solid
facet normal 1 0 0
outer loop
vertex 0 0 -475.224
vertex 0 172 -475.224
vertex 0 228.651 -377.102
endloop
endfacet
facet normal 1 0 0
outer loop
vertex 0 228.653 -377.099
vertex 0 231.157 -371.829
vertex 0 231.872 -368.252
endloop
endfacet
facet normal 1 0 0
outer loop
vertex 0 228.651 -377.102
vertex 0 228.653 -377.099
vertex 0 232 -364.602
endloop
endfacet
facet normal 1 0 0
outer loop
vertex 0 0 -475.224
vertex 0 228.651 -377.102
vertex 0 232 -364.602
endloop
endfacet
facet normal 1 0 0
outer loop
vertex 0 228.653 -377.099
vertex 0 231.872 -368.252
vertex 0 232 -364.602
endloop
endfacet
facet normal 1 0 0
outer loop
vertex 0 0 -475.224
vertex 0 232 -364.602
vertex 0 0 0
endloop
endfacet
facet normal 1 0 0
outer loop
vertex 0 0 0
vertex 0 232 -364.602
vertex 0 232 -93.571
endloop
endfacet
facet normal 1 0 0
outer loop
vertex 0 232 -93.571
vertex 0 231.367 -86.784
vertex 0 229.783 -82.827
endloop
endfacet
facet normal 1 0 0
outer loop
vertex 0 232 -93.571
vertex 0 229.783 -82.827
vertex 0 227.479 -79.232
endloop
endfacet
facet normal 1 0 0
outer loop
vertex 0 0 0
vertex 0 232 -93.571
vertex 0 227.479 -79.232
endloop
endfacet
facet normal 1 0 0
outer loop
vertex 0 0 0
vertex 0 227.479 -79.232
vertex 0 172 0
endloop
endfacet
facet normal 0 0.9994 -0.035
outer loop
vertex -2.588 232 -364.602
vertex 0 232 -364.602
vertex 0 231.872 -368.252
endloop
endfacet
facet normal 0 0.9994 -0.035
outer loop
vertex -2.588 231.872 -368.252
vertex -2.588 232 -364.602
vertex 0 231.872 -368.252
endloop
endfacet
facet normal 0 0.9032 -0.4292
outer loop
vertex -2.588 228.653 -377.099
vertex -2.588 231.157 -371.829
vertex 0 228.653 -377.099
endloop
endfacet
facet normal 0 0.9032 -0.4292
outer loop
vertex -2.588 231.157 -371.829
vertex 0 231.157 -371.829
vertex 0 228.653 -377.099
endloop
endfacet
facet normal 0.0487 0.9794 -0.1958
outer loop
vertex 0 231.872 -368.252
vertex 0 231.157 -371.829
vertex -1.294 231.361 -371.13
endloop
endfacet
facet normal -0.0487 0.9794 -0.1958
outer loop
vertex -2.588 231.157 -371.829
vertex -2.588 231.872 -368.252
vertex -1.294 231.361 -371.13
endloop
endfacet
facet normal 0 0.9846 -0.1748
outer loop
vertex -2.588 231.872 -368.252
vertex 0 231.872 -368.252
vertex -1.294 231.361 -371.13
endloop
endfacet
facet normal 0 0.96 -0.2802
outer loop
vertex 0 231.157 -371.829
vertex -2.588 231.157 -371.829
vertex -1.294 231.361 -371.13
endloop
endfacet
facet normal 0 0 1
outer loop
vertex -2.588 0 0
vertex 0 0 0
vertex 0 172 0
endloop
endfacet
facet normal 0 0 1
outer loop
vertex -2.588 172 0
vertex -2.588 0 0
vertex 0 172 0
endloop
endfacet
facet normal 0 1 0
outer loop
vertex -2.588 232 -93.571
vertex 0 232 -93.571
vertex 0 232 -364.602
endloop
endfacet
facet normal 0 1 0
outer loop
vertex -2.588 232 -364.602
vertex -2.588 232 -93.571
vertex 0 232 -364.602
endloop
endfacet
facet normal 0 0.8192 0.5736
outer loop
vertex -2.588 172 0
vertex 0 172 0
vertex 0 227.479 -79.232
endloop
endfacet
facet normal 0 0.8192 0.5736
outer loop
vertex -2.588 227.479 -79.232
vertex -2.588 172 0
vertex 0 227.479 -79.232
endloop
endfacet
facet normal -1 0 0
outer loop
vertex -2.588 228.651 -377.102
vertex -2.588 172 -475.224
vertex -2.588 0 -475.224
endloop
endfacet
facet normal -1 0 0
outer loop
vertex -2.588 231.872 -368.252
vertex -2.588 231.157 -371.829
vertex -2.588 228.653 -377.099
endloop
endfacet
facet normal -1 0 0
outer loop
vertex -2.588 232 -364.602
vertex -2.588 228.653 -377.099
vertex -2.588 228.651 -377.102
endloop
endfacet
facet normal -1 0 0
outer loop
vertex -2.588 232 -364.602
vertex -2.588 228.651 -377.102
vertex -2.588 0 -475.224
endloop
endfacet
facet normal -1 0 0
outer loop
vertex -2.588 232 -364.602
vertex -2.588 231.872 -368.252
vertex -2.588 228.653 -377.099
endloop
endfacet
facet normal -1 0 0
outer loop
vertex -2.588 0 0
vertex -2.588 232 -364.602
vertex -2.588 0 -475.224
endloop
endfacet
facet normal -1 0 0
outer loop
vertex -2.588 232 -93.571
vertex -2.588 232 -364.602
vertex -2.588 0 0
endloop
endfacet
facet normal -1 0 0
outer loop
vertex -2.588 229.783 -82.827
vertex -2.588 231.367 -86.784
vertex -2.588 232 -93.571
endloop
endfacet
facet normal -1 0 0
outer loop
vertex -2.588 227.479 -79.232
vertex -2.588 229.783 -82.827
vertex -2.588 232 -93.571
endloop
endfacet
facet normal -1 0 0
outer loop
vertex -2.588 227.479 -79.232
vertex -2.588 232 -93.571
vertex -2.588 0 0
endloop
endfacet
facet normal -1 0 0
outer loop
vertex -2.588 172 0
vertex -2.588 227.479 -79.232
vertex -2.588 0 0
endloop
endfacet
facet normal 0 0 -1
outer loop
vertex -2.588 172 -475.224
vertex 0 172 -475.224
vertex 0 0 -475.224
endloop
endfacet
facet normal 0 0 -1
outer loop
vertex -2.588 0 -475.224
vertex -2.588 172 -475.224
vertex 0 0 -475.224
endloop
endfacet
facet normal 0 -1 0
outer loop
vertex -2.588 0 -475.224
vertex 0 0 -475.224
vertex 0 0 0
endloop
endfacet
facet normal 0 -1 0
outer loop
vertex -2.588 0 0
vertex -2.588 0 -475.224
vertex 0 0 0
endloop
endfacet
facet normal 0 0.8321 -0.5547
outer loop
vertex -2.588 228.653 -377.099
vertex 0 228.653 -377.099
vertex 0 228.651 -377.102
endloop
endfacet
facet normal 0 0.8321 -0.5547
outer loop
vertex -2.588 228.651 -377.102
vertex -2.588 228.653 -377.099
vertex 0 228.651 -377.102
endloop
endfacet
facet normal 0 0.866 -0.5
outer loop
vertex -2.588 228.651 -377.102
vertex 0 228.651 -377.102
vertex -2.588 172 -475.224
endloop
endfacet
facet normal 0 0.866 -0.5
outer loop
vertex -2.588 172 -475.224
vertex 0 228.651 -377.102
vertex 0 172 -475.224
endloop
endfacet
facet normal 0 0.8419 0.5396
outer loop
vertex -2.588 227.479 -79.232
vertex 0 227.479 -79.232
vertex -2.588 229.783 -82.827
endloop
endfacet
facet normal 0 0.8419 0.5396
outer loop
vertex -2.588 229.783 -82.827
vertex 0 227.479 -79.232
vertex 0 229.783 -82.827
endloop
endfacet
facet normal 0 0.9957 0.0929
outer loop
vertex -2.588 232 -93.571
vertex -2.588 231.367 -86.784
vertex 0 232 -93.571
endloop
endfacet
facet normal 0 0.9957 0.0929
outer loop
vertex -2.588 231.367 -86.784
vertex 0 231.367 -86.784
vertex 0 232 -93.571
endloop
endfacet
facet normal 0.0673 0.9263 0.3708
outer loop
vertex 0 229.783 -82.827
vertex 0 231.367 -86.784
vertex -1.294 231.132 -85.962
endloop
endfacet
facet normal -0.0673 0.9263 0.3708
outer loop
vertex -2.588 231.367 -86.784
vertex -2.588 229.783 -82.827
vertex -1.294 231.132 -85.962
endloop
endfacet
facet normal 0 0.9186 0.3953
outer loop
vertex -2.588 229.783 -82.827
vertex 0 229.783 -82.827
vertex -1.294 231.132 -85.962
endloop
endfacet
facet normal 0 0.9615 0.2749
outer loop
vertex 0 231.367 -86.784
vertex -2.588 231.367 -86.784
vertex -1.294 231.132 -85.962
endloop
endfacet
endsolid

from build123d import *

# Parameters (mm, degrees)
BASE_FLANGE1_DEPTH = 2.588


# Sheet-metal steps are written as plain solids
with BuildPart() as part:
    # Base-Flange1: sheet metal written as solids
    # Sketch1 → Base-Flange1 (new body)
    with BuildSketch(Plane(origin=(0, 0, 0), x_dir=(0, 0, -1), z_dir=(1, 0, 0))):
        Polygon((0, 172), (85.688880405, 232), (371.300951546, 232), (475.224, 172), (475.224, 0), (0, 0), align=None)
    extrude(amount=-BASE_FLANGE1_DEPTH)

    # Fillet1
    # a fillet whose section is not a circle: 25 mm, written as the material it takes off along each edge
    with BuildSketch(Plane(origin=(19.706174305, 232, -85.688880405), x_dir=(0, -0.5735764363510439, 0.8191520442889934), z_dir=(-1, 0, 0))) as fillet1_piece_1:
        with BuildLine():
            add(Edge.make_bspline([(7.882469722, 0), (6.425514187, 0), (4.968558652, 0), (1.72149306, -0.207126843), (-1.291361483, -1.157076231), (-4.070004977, -2.849848165), (-5.263473082, -3.685523529), (-6.456941187, -4.521198893)], knots=[0, 0, 0, 0, 0, 0, 0.5, 0.5, 1, 1, 1, 1, 1, 1], degree=5))
            Line((-6.456941187, -4.521198893), (0, 0))
            Line((0, 0), (7.882469722, 0))
        make_face()
    extrude(amount=42.00034861, mode=Mode.SUBTRACT)
    with BuildSketch(Plane(origin=(16.746824527, 232, -371.300951546), x_dir=(0, 0, 1), z_dir=(-1, 0, 0))) as fillet1_piece_2:
        with BuildLine():
            add(Edge.make_bspline([(6.698729811, 0), (5.455779776, 0), (4.212829741, 0), (1.444392876, -0.149716053), (-1.176022897, -0.851854343), (-3.648417578, -2.106414871), (-4.724843884, -2.727889888), (-5.801270189, -3.349364905)], knots=[0, 0, 0, 0, 0, 0, 0.5, 0.5, 1, 1, 1, 1, 1, 1], degree=5))
            Line((-5.801270189, -3.349364905), (0, 0))
            Line((0, 0), (6.698729811, 0))
        make_face()
    extrude(amount=36.081649054, mode=Mode.SUBTRACT)


solid = part.part
